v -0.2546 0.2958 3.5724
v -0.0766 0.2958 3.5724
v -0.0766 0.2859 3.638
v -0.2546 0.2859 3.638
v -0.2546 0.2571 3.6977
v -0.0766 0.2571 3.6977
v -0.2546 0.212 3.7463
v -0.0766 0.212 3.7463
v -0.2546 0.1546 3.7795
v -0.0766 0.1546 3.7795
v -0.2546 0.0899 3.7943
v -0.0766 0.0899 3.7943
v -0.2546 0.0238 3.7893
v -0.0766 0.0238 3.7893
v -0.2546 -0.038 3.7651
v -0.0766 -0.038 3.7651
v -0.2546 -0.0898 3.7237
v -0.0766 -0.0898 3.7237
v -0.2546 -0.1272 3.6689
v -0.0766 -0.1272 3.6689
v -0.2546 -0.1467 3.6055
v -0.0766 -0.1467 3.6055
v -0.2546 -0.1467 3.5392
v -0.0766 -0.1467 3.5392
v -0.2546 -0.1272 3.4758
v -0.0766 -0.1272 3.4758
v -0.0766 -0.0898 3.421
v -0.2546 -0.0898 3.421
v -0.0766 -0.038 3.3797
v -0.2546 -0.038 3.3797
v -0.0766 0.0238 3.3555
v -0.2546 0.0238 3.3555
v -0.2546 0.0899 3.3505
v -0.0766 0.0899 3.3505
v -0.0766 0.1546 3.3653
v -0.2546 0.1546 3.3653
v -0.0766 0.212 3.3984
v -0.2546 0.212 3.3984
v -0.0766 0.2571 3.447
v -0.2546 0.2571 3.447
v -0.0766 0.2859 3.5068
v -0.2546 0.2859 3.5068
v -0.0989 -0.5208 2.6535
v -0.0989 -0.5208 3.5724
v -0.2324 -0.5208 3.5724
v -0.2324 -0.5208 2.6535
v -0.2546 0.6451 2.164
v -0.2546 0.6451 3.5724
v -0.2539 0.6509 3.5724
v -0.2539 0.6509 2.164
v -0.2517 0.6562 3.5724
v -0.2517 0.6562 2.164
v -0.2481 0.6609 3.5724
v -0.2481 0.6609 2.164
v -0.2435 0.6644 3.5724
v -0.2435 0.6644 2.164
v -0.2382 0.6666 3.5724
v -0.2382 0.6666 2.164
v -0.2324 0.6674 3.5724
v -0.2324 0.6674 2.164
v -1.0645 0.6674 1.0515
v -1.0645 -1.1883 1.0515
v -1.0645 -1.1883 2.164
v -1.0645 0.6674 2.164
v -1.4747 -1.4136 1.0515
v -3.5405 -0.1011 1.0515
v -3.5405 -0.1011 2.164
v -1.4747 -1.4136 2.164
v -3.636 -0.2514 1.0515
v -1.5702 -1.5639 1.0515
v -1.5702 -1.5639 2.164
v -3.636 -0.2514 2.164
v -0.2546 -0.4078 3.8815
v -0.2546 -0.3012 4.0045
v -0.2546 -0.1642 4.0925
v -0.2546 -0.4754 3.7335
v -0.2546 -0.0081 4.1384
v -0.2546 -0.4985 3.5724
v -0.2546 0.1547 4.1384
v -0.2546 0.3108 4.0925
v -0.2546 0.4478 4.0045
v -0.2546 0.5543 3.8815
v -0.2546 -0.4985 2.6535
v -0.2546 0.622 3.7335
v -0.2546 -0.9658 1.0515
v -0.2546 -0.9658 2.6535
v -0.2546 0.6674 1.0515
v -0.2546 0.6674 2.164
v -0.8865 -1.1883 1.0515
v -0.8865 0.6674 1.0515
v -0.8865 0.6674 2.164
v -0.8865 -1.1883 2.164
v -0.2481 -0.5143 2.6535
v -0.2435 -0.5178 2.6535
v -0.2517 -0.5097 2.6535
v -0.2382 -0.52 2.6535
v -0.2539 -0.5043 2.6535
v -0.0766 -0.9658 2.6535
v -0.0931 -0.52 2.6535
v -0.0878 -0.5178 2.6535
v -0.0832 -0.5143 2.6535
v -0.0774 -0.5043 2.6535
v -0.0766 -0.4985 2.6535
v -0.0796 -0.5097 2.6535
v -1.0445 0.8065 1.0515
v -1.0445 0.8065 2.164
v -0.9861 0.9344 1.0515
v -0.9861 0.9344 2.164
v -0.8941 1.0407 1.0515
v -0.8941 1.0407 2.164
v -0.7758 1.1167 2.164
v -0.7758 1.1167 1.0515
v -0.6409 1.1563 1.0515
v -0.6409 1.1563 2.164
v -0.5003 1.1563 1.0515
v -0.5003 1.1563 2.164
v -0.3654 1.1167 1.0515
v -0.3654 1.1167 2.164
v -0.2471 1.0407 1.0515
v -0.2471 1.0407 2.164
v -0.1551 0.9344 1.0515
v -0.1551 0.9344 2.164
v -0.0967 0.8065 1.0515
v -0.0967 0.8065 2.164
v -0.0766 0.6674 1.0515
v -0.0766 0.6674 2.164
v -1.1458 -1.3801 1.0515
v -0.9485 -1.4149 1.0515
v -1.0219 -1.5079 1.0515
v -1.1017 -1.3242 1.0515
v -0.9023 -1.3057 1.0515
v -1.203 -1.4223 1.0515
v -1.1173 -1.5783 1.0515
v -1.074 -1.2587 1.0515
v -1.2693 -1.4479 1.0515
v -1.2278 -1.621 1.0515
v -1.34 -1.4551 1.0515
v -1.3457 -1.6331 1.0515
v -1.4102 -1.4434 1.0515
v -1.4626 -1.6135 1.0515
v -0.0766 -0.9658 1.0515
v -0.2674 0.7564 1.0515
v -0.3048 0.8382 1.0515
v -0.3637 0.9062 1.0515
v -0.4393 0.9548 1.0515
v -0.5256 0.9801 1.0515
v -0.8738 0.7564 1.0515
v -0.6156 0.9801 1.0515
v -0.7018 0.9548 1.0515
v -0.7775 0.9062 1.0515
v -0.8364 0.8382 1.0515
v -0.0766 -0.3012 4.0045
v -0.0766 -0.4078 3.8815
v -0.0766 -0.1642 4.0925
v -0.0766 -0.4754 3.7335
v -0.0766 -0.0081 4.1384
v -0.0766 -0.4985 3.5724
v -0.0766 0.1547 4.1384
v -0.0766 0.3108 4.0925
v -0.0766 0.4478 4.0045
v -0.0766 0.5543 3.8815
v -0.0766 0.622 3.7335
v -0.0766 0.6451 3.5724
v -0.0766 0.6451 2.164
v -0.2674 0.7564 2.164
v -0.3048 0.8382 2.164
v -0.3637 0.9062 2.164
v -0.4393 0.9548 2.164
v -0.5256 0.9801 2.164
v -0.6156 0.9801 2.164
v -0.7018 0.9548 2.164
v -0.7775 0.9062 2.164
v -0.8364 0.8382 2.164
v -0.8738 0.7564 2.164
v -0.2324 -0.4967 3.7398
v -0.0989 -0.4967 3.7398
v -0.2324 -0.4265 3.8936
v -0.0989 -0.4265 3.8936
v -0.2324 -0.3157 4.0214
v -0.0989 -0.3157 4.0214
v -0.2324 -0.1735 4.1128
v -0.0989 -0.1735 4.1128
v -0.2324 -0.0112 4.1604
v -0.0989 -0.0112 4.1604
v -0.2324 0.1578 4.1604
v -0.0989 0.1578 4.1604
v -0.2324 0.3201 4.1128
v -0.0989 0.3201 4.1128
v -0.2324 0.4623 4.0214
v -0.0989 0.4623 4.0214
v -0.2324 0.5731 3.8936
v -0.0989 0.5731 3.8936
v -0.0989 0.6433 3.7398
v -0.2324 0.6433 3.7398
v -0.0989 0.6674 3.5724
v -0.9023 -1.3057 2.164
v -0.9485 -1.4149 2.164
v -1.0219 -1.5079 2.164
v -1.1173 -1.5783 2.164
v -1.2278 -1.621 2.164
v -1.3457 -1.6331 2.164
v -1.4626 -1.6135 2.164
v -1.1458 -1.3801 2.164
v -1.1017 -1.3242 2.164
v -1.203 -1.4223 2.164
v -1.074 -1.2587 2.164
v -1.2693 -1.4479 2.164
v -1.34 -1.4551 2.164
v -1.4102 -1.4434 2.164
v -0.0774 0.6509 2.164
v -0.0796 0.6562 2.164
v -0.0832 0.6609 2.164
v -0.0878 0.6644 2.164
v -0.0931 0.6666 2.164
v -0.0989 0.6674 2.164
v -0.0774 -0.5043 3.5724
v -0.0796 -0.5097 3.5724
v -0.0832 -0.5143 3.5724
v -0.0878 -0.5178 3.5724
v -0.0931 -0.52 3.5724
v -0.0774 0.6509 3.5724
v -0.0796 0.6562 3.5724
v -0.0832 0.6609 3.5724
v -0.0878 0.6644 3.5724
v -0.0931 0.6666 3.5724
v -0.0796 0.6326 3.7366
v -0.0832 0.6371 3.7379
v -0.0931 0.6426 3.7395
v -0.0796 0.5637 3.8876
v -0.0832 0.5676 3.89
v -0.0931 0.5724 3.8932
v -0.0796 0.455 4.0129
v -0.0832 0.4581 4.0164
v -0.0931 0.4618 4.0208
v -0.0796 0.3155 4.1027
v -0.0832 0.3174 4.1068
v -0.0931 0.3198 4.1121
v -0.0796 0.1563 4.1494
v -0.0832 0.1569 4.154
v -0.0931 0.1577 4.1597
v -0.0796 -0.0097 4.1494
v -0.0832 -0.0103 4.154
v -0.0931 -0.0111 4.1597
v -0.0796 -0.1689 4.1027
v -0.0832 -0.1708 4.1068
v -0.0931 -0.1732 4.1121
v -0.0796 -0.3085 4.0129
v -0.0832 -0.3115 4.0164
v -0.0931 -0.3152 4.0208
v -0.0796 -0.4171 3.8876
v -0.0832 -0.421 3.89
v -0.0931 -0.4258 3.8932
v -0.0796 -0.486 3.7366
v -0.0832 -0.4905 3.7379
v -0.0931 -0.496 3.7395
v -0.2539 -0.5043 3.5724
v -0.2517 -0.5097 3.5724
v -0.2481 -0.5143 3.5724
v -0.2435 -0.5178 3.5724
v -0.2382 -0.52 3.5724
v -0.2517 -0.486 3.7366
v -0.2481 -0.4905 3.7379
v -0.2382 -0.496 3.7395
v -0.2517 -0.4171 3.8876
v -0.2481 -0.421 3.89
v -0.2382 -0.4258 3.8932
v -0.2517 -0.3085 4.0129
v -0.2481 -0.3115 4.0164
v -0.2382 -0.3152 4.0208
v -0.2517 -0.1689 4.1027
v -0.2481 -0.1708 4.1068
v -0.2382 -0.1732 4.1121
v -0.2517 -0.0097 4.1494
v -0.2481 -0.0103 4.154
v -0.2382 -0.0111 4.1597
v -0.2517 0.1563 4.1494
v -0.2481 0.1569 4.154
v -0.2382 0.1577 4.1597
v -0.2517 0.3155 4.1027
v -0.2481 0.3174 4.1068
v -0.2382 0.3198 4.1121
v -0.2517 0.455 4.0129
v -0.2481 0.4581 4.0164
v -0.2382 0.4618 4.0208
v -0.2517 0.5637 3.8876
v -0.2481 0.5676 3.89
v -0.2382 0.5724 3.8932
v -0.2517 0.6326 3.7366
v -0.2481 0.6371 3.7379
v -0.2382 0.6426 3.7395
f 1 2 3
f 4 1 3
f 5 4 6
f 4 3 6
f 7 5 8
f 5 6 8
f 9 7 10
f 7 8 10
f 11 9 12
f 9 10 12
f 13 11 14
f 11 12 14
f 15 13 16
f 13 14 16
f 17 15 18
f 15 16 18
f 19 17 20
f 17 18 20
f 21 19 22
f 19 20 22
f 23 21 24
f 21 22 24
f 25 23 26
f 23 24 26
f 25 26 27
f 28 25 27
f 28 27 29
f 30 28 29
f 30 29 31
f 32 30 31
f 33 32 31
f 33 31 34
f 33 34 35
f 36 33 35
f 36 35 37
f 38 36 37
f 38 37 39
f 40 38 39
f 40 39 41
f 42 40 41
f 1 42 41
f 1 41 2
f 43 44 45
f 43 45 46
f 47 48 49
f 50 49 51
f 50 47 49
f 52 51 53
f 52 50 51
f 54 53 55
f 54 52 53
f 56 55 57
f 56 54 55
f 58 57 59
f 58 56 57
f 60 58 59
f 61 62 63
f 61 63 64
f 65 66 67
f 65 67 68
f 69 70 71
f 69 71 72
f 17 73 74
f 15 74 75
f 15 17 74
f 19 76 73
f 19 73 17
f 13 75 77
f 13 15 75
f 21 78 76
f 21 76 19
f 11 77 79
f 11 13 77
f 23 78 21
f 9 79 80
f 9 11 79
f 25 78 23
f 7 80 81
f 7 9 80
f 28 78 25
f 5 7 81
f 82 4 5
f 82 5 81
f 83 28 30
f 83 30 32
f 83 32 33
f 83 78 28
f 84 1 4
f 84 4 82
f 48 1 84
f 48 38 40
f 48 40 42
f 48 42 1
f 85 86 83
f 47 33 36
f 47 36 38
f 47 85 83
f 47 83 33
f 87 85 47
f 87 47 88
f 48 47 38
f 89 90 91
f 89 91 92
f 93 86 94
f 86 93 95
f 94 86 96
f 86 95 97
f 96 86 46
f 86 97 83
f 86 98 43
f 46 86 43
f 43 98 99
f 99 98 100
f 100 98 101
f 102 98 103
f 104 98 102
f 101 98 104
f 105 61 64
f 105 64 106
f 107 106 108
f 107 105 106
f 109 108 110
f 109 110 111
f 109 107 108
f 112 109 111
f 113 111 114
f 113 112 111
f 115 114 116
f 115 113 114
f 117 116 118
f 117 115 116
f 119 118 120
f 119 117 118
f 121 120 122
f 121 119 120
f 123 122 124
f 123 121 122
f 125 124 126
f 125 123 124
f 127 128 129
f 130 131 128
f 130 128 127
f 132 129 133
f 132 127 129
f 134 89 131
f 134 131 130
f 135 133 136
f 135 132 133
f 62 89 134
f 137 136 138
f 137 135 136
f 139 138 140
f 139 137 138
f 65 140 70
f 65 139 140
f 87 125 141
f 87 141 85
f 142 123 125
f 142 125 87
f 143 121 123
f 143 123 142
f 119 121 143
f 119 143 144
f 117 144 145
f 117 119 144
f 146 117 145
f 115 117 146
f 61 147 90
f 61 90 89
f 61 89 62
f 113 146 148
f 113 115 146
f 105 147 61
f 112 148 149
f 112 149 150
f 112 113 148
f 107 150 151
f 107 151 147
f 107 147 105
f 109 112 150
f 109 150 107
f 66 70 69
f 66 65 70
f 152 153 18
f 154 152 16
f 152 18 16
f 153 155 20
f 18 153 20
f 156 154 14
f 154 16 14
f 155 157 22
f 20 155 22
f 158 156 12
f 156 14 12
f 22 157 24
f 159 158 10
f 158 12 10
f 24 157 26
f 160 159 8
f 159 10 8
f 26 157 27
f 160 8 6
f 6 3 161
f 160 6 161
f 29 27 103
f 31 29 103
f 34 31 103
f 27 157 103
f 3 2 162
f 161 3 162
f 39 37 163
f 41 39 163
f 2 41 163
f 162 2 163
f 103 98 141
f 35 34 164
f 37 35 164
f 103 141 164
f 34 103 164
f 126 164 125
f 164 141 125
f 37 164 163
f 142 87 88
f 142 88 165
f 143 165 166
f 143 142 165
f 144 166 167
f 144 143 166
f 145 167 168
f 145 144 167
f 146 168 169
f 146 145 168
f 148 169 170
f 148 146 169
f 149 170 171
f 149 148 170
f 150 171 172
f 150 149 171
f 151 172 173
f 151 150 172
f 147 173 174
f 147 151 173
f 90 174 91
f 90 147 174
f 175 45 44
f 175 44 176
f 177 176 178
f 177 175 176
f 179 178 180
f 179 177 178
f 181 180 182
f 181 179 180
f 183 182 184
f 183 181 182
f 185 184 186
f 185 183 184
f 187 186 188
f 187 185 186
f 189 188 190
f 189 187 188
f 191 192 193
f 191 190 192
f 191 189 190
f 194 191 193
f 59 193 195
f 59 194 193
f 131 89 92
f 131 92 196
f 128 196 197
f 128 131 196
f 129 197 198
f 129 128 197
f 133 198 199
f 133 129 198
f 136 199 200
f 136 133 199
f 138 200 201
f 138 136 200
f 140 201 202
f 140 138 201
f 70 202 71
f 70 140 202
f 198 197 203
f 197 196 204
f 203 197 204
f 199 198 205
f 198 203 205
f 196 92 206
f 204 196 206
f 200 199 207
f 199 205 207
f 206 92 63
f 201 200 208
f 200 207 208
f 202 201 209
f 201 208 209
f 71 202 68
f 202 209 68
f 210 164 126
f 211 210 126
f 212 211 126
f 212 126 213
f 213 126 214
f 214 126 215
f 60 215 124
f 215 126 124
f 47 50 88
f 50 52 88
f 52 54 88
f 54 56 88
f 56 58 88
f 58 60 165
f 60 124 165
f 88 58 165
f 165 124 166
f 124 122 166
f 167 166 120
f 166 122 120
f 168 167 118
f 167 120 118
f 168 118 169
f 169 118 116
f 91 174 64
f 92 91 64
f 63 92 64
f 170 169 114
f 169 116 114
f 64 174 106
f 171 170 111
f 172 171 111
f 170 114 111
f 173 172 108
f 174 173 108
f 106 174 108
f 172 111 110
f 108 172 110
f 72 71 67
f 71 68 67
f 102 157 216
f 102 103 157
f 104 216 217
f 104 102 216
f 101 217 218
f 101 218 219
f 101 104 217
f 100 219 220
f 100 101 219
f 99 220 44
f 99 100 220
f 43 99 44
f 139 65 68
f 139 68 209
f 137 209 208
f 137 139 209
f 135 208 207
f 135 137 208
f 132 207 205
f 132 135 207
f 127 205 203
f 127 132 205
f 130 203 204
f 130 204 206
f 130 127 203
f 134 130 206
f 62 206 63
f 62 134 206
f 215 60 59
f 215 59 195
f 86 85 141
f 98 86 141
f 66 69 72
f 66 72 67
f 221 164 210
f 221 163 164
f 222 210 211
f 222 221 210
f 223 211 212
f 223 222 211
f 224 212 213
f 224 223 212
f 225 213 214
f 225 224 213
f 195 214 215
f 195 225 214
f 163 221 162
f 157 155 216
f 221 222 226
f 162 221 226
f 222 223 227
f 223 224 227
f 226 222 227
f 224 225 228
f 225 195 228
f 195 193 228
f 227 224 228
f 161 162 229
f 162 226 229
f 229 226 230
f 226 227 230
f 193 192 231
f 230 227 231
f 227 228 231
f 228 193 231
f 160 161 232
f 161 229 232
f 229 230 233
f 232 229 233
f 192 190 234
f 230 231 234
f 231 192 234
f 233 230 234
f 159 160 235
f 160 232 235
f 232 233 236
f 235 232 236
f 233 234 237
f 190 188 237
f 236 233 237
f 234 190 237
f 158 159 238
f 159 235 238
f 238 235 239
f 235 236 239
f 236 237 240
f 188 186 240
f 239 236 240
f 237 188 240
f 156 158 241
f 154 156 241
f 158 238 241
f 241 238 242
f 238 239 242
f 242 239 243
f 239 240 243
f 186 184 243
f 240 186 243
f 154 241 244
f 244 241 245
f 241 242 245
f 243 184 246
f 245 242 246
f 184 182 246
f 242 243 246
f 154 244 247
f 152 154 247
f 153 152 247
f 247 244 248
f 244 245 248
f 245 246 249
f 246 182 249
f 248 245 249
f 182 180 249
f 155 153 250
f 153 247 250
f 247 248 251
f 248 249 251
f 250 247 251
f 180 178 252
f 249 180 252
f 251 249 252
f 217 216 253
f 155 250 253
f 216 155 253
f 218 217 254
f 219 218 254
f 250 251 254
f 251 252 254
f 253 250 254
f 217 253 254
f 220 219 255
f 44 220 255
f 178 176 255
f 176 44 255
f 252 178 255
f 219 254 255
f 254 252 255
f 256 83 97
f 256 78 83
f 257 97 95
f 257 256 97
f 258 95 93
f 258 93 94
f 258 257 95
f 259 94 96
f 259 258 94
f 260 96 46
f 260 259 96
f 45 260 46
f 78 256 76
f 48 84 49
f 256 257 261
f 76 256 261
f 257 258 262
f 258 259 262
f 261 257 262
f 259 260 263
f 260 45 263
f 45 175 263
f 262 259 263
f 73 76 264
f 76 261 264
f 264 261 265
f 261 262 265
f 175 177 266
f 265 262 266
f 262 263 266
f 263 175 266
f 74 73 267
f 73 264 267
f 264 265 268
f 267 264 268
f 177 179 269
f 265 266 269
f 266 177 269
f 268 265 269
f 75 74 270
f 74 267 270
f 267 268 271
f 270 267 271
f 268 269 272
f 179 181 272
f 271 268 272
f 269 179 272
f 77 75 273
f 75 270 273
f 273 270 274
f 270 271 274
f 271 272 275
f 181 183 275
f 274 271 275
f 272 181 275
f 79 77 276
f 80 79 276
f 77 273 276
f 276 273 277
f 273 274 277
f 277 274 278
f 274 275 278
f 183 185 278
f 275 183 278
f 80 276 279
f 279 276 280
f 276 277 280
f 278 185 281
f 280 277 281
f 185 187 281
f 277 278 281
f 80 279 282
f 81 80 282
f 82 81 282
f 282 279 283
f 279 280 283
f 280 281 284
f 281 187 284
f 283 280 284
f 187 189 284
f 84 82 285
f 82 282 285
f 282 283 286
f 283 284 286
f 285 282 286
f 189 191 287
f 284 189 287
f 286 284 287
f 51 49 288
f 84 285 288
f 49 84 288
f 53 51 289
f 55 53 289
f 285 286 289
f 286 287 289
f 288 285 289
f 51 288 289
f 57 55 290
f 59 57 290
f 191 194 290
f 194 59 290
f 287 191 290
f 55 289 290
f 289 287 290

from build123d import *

# Parameters (mm, degrees)
BASE_FLANGE1_DEPTH  = 2.5
SKETCH6_W           = 0.4
SKETCH6_H           = 3.67
BOSS_EXTRUDE1_DEPTH = 4.5
SKETCH7_W           = 3.4
SKETCH7_H           = 1
CUT_EXTRUDE1_DEPTH  = 4.5
FILLET1_RADIUS      = 1.335
FILLET1_LENGTH      = 0.4
FILLET2_R           = 0.05
CUT_EXTRUDE2_REACH  = 13.14
SKETCH8_R           = 0.5
SCALE1_SCALE        = 0.445


# Sheet-metal steps are written as plain solids
with BuildPart() as part:
    # Sketch1 → Base-Flange1 (new body)
    with BuildSketch(Plane.XY):
        with BuildLine():
            Line((0.71, -1.835), (0.71, 1.835))
            ThreePointArc((0.71, 1.835), (0, 2.545), (-0.71, 1.835))
            Line((-0.71, 1.835), (-0.71, -2.335))
            ThreePointArc((-0.71, -2.335), (-1.228475759, -3.211432773), (-2.246268811, -3.179047252))
            Line((-2.246268811, -3.179047252), (-6.888528694, -0.229568793))
            Line((-6.888528694, -0.229568793), (-6.67402117, 0.108050107))
            Line((-6.67402117, 0.108050107), (-2.031761286, -2.841428351))
            ThreePointArc((-2.031761286, -2.841428351), (-1.421085455, -2.860859664), (-1.11, -2.335))
            Line((-1.11, -2.335), (-1.11, 1.835))
            ThreePointArc((-1.11, 1.835), (0, 2.945), (1.11, 1.835))
            Line((1.11, 1.835), (1.11, -1.835))
            Line((1.11, -1.835), (0.71, -1.835))
        make_face()
    extrude(amount=BASE_FLANGE1_DEPTH)

    # Sketch6 → Boss-Extrude1 (add)
    with BuildSketch(Plane.XY.offset(2.5)):
        with Locations((0.91, 0)):
            Rectangle(SKETCH6_W, SKETCH6_H)
    extrude(amount=BOSS_EXTRUDE1_DEPTH)

    # Sketch7 → Cut-Extrude1 (cut)
    with BuildSketch(Plane(origin=(1.11, 0, 0), x_dir=(0, 0, -1), z_dir=(1, 0, 0))):
        with Locations((-5.3, -1.335)):
            Rectangle(SKETCH7_W, SKETCH7_H)
    extrude(amount=-CUT_EXTRUDE1_DEPTH, mode=Mode.SUBTRACT)

    # Fillet1: full round fillet: the end face becomes a half cylinder, R = half its width
    fillet1_face = Plane((0.91, 0.5, 7), x_dir=(-1, 0, 0), z_dir=(0, 0, 1))  # on the end face: x along it, z out of the body
    fillet1_slab = fillet1_face.offset(-FILLET1_RADIUS / 2) * Box(FILLET1_LENGTH, 2 * FILLET1_RADIUS, FILLET1_RADIUS, mode=Mode.PRIVATE)  # the body's end, R deep
    fillet1_round = Plane((0.91, 0.5, 5.665), x_dir=(0, 0, 1), z_dir=(-1, 0, 0)) * Cylinder(FILLET1_RADIUS, FILLET1_LENGTH, mode=Mode.PRIVATE)  # its axis R under the face
    add(fillet1_slab - fillet1_round, mode=Mode.SUBTRACT)

    # Fillet2
    fillet2_edges = [part.edges().sort_by_distance(p)[0] for p in [
        (0.71, -0.835, 4.6325),
        (1.11, -0.835, 4.6325),
        (0.71, 1.835, 4.0825),
        (1.11, 1.835, 4.0825),
        (1.11, 0.5, 7),
        (0.71, 0.5, 7),
    ]]
    fillet(fillet2_edges, radius=FILLET2_R)

    # Sketch8 → Cut-Extrude2 (cut, up to next)
    with BuildSketch(Plane(origin=(1.11, 0, 0), x_dir=(0, 0, -1), z_dir=(1, 0, 0)), mode=Mode.PRIVATE) as cut_extrude2_sk1:
        with Locations(Location((-5.665, 0.5, 0), (0, 0, 90))):
            Circle(SKETCH8_R)
    cut_extrude2_tool1 = extrude(cut_extrude2_sk1.sketch, amount=-CUT_EXTRUDE2_REACH, mode=Mode.PRIVATE) & part.part
    add(cut_extrude2_tool1.solids().sort_by_distance((1.11, 0.5, 5.665))[0], mode=Mode.SUBTRACT)


with BuildPart() as part_1:
    # Scale1: scaled about (-1.02810541, -0.268832407, 1.894523092)
    add(part.part.scale(SCALE1_SCALE).moved(Location((-0.570598503, -0.149201986, 1.051460316))))


solid = part_1.part
